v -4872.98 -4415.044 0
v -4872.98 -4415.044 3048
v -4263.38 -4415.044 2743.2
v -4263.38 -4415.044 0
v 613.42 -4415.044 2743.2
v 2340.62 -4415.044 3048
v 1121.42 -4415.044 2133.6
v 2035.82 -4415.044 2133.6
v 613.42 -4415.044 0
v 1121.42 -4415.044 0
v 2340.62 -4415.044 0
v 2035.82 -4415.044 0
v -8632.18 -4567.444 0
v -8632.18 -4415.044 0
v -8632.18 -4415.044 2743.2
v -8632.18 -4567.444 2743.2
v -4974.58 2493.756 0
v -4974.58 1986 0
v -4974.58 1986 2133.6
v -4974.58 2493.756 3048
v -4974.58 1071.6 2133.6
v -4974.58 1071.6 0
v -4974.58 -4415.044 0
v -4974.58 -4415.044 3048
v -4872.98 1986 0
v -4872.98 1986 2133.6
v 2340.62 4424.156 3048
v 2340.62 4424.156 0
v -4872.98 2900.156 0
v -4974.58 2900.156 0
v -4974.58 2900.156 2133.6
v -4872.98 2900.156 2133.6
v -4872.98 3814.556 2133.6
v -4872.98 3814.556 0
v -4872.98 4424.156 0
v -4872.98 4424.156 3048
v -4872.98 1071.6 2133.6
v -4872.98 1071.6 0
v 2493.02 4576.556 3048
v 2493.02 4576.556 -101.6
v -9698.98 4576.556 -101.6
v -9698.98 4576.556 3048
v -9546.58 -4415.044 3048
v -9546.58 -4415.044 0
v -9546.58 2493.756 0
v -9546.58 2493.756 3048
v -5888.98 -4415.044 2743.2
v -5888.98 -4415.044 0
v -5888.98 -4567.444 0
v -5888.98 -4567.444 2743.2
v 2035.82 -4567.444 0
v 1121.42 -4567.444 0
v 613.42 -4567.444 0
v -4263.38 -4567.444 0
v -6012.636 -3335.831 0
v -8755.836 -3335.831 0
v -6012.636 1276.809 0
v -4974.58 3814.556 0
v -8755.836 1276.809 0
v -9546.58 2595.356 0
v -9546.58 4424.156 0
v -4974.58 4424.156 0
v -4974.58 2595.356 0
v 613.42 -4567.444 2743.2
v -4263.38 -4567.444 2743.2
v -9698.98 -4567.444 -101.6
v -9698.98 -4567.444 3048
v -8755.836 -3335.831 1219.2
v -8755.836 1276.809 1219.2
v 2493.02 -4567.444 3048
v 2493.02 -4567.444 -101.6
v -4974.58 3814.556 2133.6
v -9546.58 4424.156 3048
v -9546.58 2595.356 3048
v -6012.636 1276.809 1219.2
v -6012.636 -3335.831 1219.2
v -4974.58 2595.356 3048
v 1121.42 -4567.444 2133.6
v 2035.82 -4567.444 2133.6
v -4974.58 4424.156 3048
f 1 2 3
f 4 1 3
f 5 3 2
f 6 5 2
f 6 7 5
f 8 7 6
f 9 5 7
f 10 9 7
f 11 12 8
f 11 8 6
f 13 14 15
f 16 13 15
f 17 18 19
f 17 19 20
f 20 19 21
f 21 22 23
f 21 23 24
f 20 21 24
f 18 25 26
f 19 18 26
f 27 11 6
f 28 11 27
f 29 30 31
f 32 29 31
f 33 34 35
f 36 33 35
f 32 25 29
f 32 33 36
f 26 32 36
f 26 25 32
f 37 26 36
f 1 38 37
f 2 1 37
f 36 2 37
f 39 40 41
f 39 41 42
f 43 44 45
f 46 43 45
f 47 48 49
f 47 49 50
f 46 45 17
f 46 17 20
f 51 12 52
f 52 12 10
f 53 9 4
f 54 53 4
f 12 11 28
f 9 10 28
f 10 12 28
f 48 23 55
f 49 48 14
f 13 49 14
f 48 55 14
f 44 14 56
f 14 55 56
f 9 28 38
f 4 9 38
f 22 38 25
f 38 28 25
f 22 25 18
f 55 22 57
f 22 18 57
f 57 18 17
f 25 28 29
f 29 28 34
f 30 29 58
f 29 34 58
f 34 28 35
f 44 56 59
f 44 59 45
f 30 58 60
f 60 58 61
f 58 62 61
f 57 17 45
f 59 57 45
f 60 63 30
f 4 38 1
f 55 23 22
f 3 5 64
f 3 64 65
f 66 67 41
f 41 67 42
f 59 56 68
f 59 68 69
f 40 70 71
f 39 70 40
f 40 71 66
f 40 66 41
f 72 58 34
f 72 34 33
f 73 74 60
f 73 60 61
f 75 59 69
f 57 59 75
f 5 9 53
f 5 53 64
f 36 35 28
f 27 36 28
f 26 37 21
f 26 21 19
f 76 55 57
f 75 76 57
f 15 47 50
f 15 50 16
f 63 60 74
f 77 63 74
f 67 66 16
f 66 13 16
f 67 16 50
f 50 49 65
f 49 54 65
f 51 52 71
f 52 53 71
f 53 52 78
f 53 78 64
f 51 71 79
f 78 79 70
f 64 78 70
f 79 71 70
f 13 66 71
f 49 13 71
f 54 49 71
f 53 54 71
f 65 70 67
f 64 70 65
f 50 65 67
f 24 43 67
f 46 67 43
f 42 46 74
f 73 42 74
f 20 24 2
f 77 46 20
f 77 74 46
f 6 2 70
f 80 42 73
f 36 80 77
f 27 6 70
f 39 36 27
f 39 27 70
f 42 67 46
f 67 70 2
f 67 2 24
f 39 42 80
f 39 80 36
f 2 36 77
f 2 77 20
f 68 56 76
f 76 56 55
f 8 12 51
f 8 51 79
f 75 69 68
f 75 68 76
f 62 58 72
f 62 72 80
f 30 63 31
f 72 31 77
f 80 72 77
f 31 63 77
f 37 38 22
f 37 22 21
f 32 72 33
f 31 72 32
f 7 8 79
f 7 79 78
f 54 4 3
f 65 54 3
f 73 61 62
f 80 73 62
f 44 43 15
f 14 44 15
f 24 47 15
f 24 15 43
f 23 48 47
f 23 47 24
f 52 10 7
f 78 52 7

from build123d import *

# Parameters (mm, degrees)
F0_W      = 12192
F0_H      = 9144
F0_W_2    = 11887.2
F0_H_2    = 8839.2
F1_DEPTH  = 3048
F2_W      = 9144
F2_H      = 101.6
F3_DEPTH  = 12192
F4_W      = 101.6
F4_H      = 3048
F5_DEPTH  = 8839.2
F6_W      = 101.6
F6_H      = 3048
F7_DEPTH  = 4572
F8_W      = 2743.2
F8_H      = 2743.2
F9_DEPTH  = 1574.8
F10_W     = 4876.8
F10_H     = 2743.2
F11_DEPTH = 3378.2
F12_W     = 914.4
F12_H     = 2133.6
F13_DEPTH = 1320.8
F14_W     = 914.4
F14_H     = 2133.6
F15_DEPTH = 660.4
F16_W     = 914.4
F16_H     = 2133.6
F17_DEPTH = 508
F18_W     = 2743.2
F18_H     = 4612.64
F19_DEPTH = 1219.2


with BuildPart() as f1:
    # F0 (on Top) → F1 (new body)
    with BuildSketch(Plane.XY):
        with Locations((-3602.979988, 4.555729)):
            Rectangle(F0_W, F0_H)
        with Locations((-3602.979988, 4.555729)):
            Rectangle(F0_W_2, F0_H_2, mode=Mode.SUBTRACT)
    extrude(amount=F1_DEPTH)

    # F2 (on face) → F3 (join, through all)
    with BuildSketch(Plane.YZ.offset(2493.020012)):
        with Locations((4.555729, -50.8)):
            Rectangle(F2_W, F2_H)
    extrude(amount=-F3_DEPTH)

    # F4 (on face) → F5 (join, through all)
    with BuildSketch(Plane(origin=(0, -4415.044271, 0), x_dir=(-1, 0, 0), z_dir=(0, 1, 0))):
        with Locations((4923.779988, 1524)):
            Rectangle(F4_W, F4_H)
    extrude(amount=F5_DEPTH)

    # F6 (on face) → F7 (join, through all)
    with BuildSketch(Plane(origin=(-4974.579988, 0, 0), x_dir=(0, -1, 0), z_dir=(-1, 0, 0))):
        with Locations((-2544.555729, 1524)):
            Rectangle(F6_W, F6_H)
    extrude(amount=F7_DEPTH)

    # F8 (on face) → F9 (cut)
    with BuildSketch(Plane(origin=(0, -4415.044271, 0), x_dir=(-1, 0, 0), z_dir=(0, 1, 0))):
        with Locations((7260.579988, 1371.6)):
            Rectangle(F8_W, F8_H)
    extrude(amount=-F9_DEPTH, mode=Mode.SUBTRACT)

    # F10 (on face) → F11 (cut)
    with BuildSketch(Plane(origin=(0, -4415.044271, 0), x_dir=(-1, 0, 0), z_dir=(0, 1, 0))):
        with Locations((1824.979988, 1371.6)):
            Rectangle(F10_W, F10_H)
    extrude(amount=-F11_DEPTH, mode=Mode.SUBTRACT)

    # F12 (on face) → F13 (cut)
    with BuildSketch(Plane(origin=(-4974.579988, 0, 0), x_dir=(0, -1, 0), z_dir=(-1, 0, 0))):
        with Locations((-3357.355729, 1066.8)):
            Rectangle(F12_W, F12_H)
    extrude(amount=-F13_DEPTH, mode=Mode.SUBTRACT)

    # F14 (on face) → F15 (cut)
    with BuildSketch(Plane.YZ.offset(-4872.979988)):
        with Locations((1528.800061, 1066.8)):
            Rectangle(F14_W, F14_H)
    extrude(amount=-F15_DEPTH, mode=Mode.SUBTRACT)

    # F16 (on face) → F17 (cut)
    with BuildSketch(Plane(origin=(0, -4415.044271, 0), x_dir=(-1, 0, 0), z_dir=(0, 1, 0))):
        with Locations((-1578.620012, 1066.8)):
            Rectangle(F16_W, F16_H)
    extrude(amount=-F17_DEPTH, mode=Mode.SUBTRACT)

    # F18 (on face) → F19 (join)
    with BuildSketch(Plane.XY):
        with Locations((-7384.23562, -1029.511064)):
            Rectangle(F18_W, F18_H)
    extrude(amount=F19_DEPTH)


solid = f1.part
